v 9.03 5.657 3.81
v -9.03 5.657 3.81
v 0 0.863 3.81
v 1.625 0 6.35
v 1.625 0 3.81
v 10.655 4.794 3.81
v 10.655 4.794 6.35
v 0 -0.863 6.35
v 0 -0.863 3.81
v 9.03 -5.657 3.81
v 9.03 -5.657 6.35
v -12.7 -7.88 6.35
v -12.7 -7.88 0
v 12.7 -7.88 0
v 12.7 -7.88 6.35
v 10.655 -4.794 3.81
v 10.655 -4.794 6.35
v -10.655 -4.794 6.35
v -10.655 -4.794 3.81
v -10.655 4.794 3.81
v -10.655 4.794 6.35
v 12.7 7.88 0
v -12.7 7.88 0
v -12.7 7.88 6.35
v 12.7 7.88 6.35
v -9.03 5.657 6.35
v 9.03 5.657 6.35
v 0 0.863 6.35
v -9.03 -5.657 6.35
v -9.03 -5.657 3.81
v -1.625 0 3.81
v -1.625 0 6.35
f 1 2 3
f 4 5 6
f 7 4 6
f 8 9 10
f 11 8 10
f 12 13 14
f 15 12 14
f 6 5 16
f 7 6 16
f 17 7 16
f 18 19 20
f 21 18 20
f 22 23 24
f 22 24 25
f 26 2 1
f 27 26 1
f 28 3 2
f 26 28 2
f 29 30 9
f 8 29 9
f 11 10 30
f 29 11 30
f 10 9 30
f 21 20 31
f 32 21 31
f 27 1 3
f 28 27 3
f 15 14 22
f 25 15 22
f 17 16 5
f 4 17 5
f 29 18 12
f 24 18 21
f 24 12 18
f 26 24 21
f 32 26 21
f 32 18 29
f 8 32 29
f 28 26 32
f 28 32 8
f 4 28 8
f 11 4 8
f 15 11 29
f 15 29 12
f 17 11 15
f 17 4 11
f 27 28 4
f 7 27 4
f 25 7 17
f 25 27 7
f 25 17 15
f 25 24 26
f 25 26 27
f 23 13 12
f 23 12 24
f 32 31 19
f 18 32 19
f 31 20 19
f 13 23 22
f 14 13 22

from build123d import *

# Parameters (mm, degrees)
F0_W     = 25.4
F0_H     = 15.759564
F1_DEPTH = 6.35
F2_DEPTH = 3.81


with BuildPart() as f1:
    # F0 (on Top) → F1 (new body)
    with BuildSketch(Plane.XY):
        Rectangle(F0_W, F0_H)
        Polygon((-10.654746, -4.793949), (-10.654746, 4.793949), (-1.625014, 0), align=None, mode=Mode.SUBTRACT)
        Polygon((9.029732, -5.65668), (-9.029732, -5.65668), (0, -0.862732), align=None, mode=Mode.SUBTRACT)
        Polygon((0, 0.862732), (-9.029732, 5.65668), (9.029732, 5.65668), align=None, mode=Mode.SUBTRACT)
        Polygon((1.625014, 0), (10.654746, 4.793949), (10.654746, -4.793949), align=None, mode=Mode.SUBTRACT)
    extrude(amount=F1_DEPTH)

    # F0 (on Top) → F2 (join)
    with BuildSketch(Plane.XY):
        Polygon((9.029732, 5.65668), (-9.029732, 5.65668), (0, 0.862732), align=None)
        Polygon((-1.625014, 0), (-10.654746, 4.793949), (-10.654746, -4.793949), align=None)
        Polygon((0, -0.862732), (-9.029732, -5.65668), (9.029732, -5.65668), align=None)
        Polygon((10.654746, -4.793949), (10.654746, 4.793949), (1.625014, 0), align=None)
    extrude(amount=F2_DEPTH)


solid = f1.part
